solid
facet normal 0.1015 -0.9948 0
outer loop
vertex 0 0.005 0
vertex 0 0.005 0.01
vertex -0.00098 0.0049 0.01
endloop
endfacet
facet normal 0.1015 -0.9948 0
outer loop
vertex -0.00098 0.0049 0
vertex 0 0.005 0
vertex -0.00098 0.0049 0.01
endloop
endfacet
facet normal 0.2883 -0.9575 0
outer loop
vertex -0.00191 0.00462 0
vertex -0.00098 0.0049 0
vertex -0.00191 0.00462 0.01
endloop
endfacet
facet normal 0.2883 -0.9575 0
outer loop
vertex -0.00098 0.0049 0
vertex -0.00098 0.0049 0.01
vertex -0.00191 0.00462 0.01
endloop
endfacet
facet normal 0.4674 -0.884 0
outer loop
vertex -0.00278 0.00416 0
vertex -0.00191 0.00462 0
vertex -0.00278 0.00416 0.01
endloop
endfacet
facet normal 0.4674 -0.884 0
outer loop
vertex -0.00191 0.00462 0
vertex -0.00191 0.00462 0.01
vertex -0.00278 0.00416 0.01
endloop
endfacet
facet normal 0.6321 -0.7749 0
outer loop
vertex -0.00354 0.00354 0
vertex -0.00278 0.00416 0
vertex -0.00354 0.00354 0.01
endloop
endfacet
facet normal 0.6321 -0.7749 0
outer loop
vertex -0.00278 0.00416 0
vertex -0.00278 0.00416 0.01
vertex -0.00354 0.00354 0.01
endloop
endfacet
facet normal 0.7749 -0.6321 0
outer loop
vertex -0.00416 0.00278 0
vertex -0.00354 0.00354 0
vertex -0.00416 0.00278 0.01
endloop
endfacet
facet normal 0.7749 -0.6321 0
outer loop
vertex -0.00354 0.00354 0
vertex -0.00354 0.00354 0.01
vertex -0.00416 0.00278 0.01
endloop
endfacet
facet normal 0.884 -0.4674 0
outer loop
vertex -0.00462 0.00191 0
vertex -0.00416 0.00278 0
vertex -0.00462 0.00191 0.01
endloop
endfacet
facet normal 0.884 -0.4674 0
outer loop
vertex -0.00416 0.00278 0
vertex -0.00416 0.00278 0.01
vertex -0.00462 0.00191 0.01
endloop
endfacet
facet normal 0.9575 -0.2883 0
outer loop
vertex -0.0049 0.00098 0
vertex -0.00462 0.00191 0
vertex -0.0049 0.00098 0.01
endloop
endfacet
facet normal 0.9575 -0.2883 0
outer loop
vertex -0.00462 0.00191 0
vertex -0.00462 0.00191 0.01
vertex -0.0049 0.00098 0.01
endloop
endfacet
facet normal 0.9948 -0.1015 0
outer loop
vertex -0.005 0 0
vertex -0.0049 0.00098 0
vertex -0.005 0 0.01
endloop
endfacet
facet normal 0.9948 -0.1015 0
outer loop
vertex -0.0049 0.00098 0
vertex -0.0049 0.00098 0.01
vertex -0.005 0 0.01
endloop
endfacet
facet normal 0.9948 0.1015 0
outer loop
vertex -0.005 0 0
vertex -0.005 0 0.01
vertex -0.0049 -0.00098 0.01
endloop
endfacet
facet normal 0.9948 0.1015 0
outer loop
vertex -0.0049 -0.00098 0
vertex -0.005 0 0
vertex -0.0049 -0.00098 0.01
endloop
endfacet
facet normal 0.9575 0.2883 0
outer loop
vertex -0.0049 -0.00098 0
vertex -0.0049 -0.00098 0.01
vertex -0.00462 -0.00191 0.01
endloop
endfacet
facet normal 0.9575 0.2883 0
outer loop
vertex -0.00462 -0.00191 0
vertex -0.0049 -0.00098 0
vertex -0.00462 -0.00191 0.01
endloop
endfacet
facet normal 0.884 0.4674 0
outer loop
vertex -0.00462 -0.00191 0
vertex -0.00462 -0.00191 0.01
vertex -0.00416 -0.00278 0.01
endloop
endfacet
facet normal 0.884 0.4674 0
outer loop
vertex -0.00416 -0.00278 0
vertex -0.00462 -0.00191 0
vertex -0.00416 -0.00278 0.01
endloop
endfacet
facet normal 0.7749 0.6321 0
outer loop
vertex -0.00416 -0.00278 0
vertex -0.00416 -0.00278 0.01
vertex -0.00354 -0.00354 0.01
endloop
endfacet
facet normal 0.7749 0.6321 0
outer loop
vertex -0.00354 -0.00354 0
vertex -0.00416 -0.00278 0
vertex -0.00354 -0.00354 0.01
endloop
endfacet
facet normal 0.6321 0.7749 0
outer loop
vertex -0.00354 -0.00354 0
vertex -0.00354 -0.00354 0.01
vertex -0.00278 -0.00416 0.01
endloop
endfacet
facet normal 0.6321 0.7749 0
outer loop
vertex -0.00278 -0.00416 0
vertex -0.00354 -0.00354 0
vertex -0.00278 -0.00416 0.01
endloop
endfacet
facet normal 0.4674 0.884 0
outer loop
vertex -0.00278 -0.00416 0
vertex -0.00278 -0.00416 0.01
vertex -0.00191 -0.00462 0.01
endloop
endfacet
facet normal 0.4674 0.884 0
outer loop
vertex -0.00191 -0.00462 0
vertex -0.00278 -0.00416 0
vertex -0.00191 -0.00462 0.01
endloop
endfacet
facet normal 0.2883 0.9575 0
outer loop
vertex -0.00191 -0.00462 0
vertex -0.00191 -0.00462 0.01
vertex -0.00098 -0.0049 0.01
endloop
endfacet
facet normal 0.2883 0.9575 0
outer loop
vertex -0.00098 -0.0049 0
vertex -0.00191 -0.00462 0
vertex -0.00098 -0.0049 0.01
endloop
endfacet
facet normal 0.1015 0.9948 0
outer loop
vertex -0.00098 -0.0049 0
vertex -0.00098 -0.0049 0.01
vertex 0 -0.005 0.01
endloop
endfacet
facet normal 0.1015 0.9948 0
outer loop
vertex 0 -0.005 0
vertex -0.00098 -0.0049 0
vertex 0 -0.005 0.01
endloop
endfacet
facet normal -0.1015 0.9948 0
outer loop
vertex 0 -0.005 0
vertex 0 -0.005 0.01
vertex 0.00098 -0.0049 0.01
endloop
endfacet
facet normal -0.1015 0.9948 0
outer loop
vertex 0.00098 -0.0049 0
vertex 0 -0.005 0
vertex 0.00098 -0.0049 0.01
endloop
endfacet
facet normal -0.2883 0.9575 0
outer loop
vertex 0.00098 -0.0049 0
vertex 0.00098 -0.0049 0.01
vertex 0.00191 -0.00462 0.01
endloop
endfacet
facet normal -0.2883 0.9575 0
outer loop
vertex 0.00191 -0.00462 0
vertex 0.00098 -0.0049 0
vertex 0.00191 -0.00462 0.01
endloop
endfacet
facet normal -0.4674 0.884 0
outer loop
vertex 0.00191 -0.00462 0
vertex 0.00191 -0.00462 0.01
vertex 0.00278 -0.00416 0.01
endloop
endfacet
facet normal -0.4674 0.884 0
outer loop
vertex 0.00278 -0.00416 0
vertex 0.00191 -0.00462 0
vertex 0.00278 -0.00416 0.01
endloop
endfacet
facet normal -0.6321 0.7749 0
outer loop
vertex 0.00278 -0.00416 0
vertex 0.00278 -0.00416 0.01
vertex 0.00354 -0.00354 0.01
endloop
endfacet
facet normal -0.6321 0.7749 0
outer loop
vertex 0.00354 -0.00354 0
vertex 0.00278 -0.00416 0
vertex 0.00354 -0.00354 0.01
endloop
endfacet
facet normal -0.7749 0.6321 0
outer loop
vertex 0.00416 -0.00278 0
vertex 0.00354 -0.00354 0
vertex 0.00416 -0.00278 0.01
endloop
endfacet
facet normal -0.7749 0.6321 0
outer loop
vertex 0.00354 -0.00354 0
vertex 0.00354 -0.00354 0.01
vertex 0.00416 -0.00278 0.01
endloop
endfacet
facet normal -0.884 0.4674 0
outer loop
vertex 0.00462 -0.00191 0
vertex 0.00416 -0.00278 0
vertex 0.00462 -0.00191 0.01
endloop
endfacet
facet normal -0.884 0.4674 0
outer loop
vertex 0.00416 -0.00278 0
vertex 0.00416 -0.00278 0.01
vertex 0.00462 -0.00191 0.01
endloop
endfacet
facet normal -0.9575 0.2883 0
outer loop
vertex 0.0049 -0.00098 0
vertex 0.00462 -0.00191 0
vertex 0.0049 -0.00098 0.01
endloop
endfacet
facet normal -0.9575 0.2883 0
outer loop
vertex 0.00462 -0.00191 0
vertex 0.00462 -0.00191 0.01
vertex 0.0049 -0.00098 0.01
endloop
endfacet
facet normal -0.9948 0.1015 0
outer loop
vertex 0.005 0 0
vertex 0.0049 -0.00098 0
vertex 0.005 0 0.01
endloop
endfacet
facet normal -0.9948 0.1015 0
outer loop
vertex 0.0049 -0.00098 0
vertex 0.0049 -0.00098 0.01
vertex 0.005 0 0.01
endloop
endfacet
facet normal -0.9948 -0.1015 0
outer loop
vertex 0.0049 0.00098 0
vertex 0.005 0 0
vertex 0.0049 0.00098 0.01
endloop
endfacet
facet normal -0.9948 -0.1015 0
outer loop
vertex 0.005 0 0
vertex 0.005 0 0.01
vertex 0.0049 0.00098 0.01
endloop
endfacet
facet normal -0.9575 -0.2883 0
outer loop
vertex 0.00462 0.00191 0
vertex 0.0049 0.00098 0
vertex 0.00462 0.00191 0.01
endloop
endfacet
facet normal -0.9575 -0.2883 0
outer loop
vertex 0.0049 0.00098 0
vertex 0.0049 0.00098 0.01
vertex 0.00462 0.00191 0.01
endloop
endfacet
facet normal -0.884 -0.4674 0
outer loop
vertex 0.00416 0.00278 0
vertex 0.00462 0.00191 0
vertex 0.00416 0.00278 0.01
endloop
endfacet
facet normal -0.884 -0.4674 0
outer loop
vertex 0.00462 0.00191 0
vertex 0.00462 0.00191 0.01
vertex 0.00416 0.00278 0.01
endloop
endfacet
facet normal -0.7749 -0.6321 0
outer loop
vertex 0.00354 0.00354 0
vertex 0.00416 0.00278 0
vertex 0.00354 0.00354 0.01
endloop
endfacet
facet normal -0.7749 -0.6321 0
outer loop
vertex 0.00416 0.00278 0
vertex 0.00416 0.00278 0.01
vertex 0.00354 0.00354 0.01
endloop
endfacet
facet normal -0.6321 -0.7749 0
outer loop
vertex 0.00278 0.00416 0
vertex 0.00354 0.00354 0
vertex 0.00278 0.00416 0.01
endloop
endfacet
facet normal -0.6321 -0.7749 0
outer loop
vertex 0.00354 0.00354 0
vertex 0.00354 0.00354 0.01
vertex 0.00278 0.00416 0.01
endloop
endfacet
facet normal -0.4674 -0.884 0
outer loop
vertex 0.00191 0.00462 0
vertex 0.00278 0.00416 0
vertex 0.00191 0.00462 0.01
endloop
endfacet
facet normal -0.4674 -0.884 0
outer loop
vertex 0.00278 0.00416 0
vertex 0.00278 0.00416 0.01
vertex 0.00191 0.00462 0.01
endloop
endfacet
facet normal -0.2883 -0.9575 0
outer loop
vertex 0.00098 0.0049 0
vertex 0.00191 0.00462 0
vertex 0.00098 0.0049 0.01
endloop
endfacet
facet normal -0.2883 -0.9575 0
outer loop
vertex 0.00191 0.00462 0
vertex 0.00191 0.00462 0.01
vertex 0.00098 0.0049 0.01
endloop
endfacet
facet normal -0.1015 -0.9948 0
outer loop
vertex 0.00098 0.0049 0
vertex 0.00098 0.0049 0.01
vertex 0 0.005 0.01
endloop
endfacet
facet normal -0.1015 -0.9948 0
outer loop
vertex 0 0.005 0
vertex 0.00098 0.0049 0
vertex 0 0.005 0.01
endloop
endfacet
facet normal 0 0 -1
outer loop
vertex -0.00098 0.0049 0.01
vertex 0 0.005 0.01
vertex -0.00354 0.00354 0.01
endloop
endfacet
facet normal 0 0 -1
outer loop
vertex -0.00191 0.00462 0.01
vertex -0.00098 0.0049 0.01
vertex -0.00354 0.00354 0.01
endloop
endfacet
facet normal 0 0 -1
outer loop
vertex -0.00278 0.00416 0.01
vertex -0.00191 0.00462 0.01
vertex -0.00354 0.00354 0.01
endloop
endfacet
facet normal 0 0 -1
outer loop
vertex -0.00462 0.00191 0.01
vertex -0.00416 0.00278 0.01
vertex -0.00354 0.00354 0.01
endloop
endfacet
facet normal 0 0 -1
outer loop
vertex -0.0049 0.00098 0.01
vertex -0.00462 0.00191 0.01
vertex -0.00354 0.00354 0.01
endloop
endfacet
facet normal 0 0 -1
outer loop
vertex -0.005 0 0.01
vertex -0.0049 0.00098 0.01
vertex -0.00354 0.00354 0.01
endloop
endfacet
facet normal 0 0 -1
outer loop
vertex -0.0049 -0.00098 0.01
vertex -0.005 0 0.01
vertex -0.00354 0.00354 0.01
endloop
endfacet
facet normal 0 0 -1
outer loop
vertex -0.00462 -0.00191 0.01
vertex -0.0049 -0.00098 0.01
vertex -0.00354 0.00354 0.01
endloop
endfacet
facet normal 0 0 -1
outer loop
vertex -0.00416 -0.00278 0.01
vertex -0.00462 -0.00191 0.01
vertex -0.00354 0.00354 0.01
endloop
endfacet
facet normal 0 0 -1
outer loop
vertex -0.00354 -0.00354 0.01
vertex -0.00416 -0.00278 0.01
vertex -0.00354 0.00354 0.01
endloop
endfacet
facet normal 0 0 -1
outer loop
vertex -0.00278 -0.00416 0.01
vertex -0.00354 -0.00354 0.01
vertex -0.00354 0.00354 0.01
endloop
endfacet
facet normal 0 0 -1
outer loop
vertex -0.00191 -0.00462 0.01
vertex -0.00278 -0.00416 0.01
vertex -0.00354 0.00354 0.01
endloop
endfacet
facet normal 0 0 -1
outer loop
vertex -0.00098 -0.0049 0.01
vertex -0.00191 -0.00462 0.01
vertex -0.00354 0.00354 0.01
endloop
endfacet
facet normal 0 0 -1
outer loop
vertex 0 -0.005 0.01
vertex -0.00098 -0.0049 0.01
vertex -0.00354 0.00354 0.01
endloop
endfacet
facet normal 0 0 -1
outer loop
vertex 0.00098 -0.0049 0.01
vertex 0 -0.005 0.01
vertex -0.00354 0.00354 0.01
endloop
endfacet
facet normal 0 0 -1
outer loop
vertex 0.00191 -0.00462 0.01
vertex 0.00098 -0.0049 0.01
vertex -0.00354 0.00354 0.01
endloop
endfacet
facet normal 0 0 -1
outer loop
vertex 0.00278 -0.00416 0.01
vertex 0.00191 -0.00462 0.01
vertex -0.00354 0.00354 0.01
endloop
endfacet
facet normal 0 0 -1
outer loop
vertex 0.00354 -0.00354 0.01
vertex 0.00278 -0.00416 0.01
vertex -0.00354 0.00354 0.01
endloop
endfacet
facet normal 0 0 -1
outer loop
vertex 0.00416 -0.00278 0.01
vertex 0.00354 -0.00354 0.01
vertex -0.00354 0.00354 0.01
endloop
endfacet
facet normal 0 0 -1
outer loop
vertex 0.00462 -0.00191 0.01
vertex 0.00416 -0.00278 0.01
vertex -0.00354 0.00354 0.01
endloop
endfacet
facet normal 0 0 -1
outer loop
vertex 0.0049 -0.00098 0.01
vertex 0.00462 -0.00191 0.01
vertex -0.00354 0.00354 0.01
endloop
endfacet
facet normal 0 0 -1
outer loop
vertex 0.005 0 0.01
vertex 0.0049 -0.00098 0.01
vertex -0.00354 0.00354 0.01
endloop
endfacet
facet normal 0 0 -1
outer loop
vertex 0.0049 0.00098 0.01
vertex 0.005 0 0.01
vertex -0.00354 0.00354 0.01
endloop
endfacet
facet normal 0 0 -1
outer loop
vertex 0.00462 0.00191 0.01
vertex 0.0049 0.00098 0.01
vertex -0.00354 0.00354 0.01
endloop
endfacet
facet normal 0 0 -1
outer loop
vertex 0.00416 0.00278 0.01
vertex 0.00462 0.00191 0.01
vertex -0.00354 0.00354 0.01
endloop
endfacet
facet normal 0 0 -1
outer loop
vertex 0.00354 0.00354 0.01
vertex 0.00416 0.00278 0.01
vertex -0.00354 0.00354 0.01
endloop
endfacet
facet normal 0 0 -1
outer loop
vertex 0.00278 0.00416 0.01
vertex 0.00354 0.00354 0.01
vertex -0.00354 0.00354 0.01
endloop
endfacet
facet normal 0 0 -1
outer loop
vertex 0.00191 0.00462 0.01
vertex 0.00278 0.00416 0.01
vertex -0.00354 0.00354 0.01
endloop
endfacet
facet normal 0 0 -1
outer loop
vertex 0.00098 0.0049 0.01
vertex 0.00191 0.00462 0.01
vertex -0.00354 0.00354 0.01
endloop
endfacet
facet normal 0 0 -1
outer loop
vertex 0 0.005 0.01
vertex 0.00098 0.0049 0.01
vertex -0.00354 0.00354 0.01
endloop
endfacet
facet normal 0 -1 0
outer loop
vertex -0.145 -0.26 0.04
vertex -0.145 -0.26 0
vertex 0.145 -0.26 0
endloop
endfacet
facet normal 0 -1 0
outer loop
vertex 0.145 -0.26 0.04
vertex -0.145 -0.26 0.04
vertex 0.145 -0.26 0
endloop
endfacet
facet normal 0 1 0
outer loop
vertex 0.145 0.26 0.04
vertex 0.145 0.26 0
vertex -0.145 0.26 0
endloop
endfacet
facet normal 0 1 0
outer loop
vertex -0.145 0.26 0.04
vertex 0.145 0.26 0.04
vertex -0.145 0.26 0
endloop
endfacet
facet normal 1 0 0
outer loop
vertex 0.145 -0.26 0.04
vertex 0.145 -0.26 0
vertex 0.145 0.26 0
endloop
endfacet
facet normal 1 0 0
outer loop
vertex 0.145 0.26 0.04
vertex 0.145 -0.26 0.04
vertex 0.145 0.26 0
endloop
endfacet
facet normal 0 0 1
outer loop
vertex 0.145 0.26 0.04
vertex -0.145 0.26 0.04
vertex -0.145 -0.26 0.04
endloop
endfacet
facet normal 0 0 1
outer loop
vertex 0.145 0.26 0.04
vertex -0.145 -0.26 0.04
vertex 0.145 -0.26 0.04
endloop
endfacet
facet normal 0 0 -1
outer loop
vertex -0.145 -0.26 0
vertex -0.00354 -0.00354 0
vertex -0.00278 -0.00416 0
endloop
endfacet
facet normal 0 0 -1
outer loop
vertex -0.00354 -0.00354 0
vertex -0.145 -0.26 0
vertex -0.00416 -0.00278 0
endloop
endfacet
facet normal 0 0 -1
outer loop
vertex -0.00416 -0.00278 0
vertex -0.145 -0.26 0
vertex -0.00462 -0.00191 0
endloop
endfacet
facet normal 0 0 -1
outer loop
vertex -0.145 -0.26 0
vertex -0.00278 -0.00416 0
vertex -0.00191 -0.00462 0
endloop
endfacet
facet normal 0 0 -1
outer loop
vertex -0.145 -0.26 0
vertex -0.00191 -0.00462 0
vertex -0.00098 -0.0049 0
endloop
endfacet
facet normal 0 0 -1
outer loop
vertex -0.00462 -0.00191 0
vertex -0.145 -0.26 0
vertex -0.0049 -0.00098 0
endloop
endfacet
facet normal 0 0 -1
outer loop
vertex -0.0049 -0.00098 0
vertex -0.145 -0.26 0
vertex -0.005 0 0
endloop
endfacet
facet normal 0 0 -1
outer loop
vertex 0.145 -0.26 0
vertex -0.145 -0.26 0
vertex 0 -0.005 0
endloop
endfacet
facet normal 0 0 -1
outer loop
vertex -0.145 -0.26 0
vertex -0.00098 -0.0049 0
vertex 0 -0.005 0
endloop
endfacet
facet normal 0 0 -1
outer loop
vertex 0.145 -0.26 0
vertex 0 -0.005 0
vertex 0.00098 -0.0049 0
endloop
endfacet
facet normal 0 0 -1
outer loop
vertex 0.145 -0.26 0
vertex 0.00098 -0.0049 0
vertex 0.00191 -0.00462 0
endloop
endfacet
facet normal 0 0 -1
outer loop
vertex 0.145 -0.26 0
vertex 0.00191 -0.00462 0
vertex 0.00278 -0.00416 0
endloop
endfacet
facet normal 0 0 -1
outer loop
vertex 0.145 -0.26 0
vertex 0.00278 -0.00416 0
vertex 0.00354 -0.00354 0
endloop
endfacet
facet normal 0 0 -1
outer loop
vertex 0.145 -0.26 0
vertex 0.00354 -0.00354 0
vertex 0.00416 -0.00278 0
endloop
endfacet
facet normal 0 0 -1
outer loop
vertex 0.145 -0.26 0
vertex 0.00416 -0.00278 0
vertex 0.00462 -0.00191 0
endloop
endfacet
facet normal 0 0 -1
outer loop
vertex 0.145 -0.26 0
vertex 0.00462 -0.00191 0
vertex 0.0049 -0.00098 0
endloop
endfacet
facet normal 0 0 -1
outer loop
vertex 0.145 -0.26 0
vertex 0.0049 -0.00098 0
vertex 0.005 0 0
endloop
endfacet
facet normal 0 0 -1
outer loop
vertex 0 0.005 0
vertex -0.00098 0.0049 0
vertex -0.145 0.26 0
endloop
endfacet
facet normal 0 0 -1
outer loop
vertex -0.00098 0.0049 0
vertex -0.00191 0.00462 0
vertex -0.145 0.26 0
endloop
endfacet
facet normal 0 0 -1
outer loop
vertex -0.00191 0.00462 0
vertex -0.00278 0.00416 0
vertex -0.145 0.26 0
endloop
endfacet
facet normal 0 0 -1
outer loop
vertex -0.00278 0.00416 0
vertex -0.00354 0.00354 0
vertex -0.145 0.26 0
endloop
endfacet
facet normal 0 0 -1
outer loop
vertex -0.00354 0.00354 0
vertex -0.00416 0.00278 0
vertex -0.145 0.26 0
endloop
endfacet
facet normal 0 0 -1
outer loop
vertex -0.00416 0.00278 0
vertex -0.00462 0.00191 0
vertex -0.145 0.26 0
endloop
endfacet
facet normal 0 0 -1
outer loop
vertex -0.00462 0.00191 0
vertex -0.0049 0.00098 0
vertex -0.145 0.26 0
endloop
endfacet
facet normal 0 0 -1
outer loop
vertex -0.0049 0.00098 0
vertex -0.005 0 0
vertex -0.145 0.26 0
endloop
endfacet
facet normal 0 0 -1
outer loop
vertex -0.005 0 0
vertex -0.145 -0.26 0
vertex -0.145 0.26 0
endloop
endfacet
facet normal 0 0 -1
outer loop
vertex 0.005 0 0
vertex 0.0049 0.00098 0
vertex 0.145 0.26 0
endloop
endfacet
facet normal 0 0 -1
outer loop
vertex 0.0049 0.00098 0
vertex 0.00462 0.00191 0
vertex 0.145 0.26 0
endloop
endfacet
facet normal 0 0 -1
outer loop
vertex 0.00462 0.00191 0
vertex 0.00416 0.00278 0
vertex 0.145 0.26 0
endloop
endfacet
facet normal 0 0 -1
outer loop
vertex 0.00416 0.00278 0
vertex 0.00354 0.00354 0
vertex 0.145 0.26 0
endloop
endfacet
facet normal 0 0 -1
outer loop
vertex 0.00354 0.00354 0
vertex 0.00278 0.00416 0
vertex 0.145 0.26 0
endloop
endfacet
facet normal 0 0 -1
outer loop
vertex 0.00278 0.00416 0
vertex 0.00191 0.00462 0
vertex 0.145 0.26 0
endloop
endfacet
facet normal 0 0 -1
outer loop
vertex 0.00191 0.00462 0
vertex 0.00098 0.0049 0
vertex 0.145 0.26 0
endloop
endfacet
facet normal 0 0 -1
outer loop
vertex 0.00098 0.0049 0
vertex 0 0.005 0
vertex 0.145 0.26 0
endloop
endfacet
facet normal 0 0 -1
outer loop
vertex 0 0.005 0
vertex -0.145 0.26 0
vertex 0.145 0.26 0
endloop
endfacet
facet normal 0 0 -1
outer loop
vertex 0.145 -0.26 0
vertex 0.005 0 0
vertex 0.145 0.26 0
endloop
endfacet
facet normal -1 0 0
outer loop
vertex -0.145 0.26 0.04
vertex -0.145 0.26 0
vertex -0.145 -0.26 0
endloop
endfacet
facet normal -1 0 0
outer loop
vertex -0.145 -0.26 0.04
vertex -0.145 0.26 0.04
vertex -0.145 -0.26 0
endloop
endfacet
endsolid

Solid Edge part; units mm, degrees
sketch "Sketch1" plane through (0, 0, 0) normal (0, 0, 1) x (1, 0, 0)
  line L0 (-0.145, -0.26) -> (0.145, -0.26)
  line L1 (0.145, -0.26) -> (0.145, 0.26)
  line L2 (0.145, 0.26) -> (-0.145, 0.26)
  line L3 (-0.145, 0.26) -> (-0.145, -0.26)
  dimension "D1" = 0.29
  dimension "D2" = 0.52
extrude "Protrusion1" add sketch "Sketch1" along normal blind 0.04
hole "Bohrung_1" at (0, 0, 0) direction (0, 0, 1) diameter 0.01 depth 0.01
